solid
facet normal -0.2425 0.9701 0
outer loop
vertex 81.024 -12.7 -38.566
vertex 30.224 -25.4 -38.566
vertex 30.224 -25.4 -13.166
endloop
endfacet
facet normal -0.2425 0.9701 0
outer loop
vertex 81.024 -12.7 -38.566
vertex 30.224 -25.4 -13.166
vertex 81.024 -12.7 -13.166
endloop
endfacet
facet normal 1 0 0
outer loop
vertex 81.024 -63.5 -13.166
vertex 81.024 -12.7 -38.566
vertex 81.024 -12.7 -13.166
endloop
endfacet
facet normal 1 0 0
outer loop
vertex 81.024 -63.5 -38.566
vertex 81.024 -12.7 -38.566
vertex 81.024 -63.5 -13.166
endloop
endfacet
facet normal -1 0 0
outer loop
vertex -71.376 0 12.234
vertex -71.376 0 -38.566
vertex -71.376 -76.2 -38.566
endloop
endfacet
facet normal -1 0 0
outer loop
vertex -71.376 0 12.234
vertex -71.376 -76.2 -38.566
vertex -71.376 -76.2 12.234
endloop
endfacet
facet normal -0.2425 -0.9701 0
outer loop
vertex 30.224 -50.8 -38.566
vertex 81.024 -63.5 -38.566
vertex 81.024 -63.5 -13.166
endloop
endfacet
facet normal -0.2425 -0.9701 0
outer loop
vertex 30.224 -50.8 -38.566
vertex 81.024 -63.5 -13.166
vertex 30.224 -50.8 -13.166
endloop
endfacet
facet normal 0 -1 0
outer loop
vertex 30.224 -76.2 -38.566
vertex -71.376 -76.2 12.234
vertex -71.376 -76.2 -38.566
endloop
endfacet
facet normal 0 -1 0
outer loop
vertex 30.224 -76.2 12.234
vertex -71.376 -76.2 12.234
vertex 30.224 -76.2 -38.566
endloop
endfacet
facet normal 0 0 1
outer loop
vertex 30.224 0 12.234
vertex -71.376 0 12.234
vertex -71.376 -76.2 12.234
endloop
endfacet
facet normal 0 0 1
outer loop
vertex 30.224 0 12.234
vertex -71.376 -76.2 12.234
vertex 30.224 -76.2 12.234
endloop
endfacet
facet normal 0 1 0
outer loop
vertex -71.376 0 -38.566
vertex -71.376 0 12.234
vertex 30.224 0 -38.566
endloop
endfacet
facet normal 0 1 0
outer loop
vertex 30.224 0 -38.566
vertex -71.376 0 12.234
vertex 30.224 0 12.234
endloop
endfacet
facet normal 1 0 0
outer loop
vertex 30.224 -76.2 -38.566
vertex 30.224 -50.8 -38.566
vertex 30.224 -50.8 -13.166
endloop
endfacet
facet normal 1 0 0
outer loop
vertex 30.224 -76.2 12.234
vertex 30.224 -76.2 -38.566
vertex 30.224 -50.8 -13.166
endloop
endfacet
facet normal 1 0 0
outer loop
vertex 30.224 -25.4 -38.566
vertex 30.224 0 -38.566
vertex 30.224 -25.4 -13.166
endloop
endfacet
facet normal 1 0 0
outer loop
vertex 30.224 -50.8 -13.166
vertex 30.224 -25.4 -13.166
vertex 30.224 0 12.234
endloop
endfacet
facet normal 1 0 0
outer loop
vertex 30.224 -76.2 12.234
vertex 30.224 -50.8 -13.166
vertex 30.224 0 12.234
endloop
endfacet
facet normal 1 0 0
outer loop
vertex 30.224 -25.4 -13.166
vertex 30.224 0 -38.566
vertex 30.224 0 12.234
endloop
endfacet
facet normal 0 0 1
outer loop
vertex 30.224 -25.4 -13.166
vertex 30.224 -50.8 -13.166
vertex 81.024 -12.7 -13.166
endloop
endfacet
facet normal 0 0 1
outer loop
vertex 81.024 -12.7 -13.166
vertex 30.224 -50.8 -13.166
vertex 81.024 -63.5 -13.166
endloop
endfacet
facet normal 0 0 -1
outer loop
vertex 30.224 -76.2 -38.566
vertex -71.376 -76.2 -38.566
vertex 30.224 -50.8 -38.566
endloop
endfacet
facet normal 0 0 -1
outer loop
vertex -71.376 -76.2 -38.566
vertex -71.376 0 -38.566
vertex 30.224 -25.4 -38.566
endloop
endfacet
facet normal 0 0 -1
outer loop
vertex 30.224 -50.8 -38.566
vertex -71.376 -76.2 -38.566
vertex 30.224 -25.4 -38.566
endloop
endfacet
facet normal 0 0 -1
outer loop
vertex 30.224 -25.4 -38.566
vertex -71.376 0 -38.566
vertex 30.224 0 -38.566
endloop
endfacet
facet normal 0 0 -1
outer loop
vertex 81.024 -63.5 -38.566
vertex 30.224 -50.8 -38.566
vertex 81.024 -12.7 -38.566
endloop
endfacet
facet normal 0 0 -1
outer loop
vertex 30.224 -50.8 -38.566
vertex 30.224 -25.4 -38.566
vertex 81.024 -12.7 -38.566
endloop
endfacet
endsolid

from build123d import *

# Parameters (mm, degrees)
F0_W     = 101.6
F0_H     = 50.8
F1_DEPTH = 76.2
F3_DEPTH = 25.4


with BuildPart() as f1:
    # F0 (on Front) → F1 (new body)
    with BuildSketch(Plane.XZ):
        with Locations((-20.575825, -13.165971)):
            Rectangle(F0_W, F0_H)
    extrude(amount=F1_DEPTH)

    # F2 (on face) → F3 (join)
    with BuildSketch(Plane(origin=(0, 0, -38.565971), x_dir=(1, 0, 0), z_dir=(0, 0, -1))):
        Polygon((81.024175, 63.5), (30.224175, 50.8), (30.224175, 25.4), (81.024175, 12.7), align=None)
    extrude(amount=-F3_DEPTH)


solid = f1.part
